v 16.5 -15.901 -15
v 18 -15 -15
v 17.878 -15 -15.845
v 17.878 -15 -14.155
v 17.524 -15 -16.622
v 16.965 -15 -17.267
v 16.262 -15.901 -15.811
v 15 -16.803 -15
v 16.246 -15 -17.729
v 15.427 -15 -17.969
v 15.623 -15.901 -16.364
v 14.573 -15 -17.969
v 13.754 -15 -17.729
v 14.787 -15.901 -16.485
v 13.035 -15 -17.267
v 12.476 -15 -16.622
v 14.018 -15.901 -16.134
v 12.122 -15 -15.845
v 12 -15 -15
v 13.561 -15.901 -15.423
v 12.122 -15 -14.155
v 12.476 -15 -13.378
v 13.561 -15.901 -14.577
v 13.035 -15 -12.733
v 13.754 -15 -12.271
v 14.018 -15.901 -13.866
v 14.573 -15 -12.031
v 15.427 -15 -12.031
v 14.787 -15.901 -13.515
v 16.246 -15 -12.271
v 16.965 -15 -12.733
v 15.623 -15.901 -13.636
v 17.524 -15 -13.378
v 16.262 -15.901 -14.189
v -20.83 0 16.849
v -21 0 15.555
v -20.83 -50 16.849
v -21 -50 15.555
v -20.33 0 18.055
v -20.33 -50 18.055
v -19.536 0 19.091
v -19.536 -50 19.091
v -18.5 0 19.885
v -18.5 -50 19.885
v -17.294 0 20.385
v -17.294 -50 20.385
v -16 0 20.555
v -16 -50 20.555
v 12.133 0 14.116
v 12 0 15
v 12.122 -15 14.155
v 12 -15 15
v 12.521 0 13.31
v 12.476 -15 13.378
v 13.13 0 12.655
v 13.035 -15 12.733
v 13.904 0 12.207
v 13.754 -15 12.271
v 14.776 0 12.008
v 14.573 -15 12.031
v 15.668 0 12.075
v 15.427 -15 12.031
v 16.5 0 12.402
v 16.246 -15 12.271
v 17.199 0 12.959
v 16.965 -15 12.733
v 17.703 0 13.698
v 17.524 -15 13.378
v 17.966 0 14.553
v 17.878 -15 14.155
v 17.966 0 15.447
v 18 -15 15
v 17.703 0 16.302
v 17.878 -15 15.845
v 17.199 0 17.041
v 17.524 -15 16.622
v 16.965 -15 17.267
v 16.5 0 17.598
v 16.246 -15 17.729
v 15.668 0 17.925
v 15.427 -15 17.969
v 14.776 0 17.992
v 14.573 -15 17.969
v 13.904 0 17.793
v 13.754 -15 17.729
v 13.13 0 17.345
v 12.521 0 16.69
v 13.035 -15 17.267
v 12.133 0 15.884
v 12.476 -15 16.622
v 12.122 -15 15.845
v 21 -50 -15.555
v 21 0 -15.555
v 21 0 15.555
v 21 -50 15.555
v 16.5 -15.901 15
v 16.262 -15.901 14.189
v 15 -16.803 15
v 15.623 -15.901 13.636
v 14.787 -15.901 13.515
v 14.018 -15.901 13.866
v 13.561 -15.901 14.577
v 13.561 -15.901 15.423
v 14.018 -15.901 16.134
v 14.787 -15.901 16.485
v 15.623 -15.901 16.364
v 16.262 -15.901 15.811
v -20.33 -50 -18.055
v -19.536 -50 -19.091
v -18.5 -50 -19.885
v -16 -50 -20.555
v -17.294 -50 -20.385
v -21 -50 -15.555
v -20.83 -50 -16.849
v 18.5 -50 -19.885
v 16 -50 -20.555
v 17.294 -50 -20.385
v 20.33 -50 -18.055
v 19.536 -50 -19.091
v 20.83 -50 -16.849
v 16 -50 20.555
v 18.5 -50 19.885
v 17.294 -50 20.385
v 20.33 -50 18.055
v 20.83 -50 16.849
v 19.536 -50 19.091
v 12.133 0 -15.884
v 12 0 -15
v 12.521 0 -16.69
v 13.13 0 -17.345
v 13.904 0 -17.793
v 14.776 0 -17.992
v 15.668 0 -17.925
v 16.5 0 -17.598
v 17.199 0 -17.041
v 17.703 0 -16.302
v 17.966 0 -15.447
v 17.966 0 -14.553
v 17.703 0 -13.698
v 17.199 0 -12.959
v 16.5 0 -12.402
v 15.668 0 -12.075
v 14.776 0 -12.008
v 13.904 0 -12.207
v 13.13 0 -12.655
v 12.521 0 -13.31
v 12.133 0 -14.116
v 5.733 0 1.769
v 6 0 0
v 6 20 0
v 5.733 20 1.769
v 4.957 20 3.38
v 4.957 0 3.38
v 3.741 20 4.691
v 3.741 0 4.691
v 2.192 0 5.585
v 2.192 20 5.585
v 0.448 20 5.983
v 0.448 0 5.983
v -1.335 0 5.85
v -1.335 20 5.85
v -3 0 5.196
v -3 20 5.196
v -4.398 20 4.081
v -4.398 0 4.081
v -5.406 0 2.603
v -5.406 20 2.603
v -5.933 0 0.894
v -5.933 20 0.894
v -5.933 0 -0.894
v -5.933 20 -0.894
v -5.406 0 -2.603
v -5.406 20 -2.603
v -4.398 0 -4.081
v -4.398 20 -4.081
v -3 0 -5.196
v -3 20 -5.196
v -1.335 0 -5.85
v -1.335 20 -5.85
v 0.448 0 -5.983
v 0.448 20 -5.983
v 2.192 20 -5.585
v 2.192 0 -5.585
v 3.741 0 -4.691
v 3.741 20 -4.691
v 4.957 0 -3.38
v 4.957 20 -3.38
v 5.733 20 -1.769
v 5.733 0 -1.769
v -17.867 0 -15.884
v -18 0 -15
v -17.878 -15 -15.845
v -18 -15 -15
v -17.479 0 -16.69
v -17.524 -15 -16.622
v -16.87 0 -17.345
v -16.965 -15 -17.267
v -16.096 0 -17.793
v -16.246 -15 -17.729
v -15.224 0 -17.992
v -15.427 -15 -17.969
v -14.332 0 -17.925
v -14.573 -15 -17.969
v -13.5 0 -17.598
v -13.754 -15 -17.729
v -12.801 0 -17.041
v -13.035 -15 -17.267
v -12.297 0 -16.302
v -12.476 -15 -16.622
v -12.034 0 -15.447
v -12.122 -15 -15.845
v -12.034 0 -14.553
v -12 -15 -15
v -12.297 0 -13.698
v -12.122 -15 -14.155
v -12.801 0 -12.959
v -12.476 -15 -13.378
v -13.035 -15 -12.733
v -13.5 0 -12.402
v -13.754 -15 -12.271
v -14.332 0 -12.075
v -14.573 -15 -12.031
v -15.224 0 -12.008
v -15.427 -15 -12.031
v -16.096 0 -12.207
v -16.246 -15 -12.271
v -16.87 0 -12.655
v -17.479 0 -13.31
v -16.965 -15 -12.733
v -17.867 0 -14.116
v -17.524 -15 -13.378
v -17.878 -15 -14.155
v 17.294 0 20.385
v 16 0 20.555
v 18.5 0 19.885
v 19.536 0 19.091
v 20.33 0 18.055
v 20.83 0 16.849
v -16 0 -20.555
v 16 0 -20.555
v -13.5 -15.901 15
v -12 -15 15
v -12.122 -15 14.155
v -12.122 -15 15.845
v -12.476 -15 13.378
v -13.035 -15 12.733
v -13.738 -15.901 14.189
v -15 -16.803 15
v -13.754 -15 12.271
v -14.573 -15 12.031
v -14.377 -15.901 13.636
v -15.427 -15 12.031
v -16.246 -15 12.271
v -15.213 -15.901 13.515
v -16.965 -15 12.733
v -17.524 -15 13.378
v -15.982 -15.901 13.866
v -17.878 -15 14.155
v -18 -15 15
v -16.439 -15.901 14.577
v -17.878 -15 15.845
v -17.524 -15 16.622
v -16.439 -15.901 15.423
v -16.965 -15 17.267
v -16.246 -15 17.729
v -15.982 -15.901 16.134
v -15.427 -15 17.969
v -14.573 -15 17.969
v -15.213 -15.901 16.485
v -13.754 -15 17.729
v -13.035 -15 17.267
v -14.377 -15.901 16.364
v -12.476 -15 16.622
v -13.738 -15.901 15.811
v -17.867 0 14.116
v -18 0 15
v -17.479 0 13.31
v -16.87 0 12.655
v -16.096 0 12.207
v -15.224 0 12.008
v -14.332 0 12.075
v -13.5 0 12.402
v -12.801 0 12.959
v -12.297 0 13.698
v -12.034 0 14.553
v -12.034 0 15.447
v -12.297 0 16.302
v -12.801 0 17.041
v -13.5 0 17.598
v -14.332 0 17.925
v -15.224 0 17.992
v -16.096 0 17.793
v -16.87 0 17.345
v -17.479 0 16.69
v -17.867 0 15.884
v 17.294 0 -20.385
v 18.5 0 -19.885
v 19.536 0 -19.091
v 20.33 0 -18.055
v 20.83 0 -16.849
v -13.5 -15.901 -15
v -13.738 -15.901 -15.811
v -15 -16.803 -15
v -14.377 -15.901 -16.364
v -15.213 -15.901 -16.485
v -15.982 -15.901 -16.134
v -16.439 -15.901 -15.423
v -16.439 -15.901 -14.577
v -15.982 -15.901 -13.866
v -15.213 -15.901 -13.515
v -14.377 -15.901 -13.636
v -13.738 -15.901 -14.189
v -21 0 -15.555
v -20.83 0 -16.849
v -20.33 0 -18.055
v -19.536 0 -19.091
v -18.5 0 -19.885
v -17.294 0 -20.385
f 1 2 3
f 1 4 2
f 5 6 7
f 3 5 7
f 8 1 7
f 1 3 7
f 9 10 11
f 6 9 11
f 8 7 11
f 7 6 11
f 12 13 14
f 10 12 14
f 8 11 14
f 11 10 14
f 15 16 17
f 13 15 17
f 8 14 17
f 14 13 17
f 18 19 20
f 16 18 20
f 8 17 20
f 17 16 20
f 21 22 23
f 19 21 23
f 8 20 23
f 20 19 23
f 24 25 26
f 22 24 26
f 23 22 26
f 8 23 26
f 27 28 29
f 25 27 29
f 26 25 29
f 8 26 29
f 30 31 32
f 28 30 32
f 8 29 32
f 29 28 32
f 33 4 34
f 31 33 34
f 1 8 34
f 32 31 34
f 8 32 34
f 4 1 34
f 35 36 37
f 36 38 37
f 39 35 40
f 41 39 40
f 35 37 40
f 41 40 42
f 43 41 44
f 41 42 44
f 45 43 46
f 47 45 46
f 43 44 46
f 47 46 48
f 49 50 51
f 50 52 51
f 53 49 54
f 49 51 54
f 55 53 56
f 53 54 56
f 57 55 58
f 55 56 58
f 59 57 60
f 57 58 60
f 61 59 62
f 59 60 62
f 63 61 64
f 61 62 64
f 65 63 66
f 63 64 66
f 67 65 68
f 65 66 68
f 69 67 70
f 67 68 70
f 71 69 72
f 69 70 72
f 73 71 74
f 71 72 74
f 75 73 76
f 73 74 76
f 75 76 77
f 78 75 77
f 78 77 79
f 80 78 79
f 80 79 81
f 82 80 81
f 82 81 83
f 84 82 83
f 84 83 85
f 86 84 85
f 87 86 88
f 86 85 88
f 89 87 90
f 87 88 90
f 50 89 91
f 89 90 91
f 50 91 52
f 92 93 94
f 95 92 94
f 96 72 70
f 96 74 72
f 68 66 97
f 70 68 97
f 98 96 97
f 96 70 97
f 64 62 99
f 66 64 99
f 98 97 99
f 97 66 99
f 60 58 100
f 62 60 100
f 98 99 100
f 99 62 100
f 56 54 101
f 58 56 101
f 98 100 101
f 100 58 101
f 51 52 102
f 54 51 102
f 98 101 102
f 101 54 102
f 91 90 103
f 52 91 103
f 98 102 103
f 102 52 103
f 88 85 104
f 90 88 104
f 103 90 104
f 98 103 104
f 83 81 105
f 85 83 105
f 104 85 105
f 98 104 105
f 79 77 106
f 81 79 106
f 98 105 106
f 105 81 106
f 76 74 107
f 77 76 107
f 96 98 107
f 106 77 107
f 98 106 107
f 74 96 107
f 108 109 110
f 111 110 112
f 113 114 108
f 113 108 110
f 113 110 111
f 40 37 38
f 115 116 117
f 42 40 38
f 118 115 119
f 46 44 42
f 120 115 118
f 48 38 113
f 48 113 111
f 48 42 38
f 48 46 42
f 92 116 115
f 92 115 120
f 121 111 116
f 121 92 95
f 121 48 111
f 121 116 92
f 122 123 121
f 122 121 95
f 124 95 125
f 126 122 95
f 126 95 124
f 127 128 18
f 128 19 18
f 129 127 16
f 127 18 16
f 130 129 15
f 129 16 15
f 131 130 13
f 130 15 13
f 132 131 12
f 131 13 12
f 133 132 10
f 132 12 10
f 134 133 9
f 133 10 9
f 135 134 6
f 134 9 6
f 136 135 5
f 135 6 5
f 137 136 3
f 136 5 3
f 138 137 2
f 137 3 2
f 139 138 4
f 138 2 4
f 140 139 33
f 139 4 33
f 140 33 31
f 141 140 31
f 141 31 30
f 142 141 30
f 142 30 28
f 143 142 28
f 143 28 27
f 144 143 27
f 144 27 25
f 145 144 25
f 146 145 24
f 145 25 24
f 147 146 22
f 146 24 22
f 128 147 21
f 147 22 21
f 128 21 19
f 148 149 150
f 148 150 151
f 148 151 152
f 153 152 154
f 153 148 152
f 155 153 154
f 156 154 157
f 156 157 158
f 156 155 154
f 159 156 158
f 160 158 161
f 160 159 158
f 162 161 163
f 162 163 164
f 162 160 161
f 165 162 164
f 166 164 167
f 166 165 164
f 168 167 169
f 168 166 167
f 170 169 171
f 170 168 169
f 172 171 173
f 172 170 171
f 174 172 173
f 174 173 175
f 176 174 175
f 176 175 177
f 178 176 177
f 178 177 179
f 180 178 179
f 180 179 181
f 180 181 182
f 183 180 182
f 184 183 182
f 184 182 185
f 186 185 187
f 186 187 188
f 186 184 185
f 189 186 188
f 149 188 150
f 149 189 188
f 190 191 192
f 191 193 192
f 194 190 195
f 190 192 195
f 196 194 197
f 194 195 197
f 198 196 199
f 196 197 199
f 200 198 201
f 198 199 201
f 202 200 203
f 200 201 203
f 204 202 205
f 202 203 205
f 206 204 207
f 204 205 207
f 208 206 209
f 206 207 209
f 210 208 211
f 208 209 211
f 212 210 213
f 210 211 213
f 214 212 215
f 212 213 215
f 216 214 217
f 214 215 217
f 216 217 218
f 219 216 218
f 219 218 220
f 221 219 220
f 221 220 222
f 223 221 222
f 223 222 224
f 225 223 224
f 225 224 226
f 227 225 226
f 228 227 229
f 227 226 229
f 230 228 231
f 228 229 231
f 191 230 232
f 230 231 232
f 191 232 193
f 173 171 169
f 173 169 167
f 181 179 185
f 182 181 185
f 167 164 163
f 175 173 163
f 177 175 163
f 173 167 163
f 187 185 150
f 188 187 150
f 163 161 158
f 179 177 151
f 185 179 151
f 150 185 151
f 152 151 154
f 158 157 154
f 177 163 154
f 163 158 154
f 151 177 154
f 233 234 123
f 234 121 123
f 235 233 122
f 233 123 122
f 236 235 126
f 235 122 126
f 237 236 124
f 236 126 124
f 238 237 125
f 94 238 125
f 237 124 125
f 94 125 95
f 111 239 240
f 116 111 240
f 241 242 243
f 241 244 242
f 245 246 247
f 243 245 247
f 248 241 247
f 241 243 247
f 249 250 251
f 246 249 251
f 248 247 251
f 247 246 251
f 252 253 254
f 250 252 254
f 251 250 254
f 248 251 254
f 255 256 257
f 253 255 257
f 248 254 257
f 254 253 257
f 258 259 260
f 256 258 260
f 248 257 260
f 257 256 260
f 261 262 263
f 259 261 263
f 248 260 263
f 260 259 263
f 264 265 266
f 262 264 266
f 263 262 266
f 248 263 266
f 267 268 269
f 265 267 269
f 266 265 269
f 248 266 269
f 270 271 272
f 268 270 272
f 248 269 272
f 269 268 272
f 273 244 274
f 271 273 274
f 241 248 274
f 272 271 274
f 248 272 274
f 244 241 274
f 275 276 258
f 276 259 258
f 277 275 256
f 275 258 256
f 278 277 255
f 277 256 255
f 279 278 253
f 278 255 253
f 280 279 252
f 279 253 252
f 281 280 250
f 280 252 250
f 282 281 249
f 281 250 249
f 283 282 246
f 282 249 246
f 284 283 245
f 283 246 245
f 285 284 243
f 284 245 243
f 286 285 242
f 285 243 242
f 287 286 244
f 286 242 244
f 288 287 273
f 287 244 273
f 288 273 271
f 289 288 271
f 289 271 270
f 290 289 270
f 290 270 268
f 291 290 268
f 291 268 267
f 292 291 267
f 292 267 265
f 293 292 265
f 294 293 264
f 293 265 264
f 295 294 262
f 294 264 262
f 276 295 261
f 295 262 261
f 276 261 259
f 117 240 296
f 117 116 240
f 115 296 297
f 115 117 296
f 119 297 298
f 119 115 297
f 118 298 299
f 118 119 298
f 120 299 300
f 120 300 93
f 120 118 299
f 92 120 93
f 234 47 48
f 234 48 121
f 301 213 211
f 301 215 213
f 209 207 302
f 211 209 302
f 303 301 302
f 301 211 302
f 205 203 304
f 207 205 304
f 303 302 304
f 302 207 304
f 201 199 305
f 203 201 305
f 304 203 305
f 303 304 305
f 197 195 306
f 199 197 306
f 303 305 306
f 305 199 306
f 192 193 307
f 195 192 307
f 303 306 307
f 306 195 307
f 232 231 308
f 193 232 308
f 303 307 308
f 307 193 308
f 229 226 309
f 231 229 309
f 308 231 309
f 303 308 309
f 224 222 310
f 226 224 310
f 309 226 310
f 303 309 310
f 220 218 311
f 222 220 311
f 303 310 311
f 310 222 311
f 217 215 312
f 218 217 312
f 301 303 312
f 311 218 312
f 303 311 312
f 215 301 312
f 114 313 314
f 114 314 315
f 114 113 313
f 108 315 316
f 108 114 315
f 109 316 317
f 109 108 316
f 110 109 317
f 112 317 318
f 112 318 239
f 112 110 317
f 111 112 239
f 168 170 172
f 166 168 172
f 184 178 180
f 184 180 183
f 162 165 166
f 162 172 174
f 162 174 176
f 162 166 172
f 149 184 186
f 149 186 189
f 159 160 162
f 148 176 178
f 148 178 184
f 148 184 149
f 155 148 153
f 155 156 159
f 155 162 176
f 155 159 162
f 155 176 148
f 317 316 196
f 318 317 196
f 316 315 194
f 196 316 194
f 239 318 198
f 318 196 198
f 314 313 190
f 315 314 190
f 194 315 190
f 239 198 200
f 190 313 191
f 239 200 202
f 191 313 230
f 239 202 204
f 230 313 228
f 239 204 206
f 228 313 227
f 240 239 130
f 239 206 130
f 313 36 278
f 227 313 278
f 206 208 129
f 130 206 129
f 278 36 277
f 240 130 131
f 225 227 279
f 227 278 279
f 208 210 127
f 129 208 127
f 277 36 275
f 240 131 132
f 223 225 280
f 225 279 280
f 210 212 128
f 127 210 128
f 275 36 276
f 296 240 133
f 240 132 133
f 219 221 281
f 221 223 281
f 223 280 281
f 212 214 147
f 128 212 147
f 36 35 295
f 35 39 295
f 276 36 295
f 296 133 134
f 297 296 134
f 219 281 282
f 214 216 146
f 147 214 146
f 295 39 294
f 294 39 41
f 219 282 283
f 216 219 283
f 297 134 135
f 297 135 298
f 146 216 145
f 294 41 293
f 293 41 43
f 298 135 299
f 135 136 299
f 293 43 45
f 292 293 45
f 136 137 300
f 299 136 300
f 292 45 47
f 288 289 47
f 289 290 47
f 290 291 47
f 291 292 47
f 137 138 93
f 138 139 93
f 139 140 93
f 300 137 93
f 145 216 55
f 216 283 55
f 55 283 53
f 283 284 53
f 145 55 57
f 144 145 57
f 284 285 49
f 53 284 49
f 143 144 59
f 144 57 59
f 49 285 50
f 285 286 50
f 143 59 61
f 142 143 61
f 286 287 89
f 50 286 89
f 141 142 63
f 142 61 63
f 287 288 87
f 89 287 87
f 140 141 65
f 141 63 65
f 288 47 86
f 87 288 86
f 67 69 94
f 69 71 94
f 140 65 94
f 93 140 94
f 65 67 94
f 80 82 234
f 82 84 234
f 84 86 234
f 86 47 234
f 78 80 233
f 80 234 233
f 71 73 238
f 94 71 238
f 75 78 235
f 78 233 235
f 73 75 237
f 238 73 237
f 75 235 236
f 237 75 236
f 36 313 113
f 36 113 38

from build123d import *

# Parameters (mm, degrees)
F0_W     = 42
F0_H     = 41.1101707086
F0_R     = 3
F0_R_2   = 6
F1_DEPTH = 50
F2_DEPTH = 20
F3_D     = 6
F3_DEPTH = 15
F3_TIP   = 1.8025818571
F4_R     = 5


with BuildPart() as f1:
    # F0 (on Front) → F1 (new body)
    with BuildSketch(Plane.XZ):
        Rectangle(F0_W, F0_H)
        with Locations((-15, -15)):
            Circle(F0_R, mode=Mode.SUBTRACT)
        with Locations((15, -15)):
            Circle(F0_R, mode=Mode.SUBTRACT)
        with Locations((-15, 15)):
            Circle(F0_R, mode=Mode.SUBTRACT)
        Circle(F0_R_2, mode=Mode.SUBTRACT)
        with Locations((15, 15)):
            Circle(F0_R, mode=Mode.SUBTRACT)
        with Locations((15, -15)):
            Circle(F0_R)
        Circle(F0_R_2)
        with Locations((15, 15)):
            Circle(F0_R)
        with Locations((-15, 15)):
            Circle(F0_R)
        with Locations((-15, -15)):
            Circle(F0_R)
    extrude(amount=F1_DEPTH)

    # F3
    with Locations(Plane(origin=(0, 0, 0), x_dir=(1, 0, 0), z_dir=(0, 1, 0))):
        with Locations((15, 15), (15, -15), (-15, -15), (-15, 15)):
            Hole(F3_D / 2, depth=F3_DEPTH)
            with Locations((0, 0, -(F3_DEPTH + F3_TIP / 2))):  # 118° drill point
                Cone(0, F3_D / 2, F3_TIP, mode=Mode.SUBTRACT)

    # F4
    f4_edges = [f1.edges().sort_by_distance(p)[0] for p in [
        (21, -25, -20.555085),
        (21, -25, 20.555085),
        (-21, -25, -20.555085),
        (-21, -25, 20.555085),
    ]]
    fillet(f4_edges, radius=F4_R)


with BuildPart() as f2:
    # F0 (on Front) → F2 (new body)
    with BuildSketch(Plane.XZ):
        Circle(F0_R_2)
    extrude(amount=-F2_DEPTH)


solid = Compound([f1.part, f2.part])
